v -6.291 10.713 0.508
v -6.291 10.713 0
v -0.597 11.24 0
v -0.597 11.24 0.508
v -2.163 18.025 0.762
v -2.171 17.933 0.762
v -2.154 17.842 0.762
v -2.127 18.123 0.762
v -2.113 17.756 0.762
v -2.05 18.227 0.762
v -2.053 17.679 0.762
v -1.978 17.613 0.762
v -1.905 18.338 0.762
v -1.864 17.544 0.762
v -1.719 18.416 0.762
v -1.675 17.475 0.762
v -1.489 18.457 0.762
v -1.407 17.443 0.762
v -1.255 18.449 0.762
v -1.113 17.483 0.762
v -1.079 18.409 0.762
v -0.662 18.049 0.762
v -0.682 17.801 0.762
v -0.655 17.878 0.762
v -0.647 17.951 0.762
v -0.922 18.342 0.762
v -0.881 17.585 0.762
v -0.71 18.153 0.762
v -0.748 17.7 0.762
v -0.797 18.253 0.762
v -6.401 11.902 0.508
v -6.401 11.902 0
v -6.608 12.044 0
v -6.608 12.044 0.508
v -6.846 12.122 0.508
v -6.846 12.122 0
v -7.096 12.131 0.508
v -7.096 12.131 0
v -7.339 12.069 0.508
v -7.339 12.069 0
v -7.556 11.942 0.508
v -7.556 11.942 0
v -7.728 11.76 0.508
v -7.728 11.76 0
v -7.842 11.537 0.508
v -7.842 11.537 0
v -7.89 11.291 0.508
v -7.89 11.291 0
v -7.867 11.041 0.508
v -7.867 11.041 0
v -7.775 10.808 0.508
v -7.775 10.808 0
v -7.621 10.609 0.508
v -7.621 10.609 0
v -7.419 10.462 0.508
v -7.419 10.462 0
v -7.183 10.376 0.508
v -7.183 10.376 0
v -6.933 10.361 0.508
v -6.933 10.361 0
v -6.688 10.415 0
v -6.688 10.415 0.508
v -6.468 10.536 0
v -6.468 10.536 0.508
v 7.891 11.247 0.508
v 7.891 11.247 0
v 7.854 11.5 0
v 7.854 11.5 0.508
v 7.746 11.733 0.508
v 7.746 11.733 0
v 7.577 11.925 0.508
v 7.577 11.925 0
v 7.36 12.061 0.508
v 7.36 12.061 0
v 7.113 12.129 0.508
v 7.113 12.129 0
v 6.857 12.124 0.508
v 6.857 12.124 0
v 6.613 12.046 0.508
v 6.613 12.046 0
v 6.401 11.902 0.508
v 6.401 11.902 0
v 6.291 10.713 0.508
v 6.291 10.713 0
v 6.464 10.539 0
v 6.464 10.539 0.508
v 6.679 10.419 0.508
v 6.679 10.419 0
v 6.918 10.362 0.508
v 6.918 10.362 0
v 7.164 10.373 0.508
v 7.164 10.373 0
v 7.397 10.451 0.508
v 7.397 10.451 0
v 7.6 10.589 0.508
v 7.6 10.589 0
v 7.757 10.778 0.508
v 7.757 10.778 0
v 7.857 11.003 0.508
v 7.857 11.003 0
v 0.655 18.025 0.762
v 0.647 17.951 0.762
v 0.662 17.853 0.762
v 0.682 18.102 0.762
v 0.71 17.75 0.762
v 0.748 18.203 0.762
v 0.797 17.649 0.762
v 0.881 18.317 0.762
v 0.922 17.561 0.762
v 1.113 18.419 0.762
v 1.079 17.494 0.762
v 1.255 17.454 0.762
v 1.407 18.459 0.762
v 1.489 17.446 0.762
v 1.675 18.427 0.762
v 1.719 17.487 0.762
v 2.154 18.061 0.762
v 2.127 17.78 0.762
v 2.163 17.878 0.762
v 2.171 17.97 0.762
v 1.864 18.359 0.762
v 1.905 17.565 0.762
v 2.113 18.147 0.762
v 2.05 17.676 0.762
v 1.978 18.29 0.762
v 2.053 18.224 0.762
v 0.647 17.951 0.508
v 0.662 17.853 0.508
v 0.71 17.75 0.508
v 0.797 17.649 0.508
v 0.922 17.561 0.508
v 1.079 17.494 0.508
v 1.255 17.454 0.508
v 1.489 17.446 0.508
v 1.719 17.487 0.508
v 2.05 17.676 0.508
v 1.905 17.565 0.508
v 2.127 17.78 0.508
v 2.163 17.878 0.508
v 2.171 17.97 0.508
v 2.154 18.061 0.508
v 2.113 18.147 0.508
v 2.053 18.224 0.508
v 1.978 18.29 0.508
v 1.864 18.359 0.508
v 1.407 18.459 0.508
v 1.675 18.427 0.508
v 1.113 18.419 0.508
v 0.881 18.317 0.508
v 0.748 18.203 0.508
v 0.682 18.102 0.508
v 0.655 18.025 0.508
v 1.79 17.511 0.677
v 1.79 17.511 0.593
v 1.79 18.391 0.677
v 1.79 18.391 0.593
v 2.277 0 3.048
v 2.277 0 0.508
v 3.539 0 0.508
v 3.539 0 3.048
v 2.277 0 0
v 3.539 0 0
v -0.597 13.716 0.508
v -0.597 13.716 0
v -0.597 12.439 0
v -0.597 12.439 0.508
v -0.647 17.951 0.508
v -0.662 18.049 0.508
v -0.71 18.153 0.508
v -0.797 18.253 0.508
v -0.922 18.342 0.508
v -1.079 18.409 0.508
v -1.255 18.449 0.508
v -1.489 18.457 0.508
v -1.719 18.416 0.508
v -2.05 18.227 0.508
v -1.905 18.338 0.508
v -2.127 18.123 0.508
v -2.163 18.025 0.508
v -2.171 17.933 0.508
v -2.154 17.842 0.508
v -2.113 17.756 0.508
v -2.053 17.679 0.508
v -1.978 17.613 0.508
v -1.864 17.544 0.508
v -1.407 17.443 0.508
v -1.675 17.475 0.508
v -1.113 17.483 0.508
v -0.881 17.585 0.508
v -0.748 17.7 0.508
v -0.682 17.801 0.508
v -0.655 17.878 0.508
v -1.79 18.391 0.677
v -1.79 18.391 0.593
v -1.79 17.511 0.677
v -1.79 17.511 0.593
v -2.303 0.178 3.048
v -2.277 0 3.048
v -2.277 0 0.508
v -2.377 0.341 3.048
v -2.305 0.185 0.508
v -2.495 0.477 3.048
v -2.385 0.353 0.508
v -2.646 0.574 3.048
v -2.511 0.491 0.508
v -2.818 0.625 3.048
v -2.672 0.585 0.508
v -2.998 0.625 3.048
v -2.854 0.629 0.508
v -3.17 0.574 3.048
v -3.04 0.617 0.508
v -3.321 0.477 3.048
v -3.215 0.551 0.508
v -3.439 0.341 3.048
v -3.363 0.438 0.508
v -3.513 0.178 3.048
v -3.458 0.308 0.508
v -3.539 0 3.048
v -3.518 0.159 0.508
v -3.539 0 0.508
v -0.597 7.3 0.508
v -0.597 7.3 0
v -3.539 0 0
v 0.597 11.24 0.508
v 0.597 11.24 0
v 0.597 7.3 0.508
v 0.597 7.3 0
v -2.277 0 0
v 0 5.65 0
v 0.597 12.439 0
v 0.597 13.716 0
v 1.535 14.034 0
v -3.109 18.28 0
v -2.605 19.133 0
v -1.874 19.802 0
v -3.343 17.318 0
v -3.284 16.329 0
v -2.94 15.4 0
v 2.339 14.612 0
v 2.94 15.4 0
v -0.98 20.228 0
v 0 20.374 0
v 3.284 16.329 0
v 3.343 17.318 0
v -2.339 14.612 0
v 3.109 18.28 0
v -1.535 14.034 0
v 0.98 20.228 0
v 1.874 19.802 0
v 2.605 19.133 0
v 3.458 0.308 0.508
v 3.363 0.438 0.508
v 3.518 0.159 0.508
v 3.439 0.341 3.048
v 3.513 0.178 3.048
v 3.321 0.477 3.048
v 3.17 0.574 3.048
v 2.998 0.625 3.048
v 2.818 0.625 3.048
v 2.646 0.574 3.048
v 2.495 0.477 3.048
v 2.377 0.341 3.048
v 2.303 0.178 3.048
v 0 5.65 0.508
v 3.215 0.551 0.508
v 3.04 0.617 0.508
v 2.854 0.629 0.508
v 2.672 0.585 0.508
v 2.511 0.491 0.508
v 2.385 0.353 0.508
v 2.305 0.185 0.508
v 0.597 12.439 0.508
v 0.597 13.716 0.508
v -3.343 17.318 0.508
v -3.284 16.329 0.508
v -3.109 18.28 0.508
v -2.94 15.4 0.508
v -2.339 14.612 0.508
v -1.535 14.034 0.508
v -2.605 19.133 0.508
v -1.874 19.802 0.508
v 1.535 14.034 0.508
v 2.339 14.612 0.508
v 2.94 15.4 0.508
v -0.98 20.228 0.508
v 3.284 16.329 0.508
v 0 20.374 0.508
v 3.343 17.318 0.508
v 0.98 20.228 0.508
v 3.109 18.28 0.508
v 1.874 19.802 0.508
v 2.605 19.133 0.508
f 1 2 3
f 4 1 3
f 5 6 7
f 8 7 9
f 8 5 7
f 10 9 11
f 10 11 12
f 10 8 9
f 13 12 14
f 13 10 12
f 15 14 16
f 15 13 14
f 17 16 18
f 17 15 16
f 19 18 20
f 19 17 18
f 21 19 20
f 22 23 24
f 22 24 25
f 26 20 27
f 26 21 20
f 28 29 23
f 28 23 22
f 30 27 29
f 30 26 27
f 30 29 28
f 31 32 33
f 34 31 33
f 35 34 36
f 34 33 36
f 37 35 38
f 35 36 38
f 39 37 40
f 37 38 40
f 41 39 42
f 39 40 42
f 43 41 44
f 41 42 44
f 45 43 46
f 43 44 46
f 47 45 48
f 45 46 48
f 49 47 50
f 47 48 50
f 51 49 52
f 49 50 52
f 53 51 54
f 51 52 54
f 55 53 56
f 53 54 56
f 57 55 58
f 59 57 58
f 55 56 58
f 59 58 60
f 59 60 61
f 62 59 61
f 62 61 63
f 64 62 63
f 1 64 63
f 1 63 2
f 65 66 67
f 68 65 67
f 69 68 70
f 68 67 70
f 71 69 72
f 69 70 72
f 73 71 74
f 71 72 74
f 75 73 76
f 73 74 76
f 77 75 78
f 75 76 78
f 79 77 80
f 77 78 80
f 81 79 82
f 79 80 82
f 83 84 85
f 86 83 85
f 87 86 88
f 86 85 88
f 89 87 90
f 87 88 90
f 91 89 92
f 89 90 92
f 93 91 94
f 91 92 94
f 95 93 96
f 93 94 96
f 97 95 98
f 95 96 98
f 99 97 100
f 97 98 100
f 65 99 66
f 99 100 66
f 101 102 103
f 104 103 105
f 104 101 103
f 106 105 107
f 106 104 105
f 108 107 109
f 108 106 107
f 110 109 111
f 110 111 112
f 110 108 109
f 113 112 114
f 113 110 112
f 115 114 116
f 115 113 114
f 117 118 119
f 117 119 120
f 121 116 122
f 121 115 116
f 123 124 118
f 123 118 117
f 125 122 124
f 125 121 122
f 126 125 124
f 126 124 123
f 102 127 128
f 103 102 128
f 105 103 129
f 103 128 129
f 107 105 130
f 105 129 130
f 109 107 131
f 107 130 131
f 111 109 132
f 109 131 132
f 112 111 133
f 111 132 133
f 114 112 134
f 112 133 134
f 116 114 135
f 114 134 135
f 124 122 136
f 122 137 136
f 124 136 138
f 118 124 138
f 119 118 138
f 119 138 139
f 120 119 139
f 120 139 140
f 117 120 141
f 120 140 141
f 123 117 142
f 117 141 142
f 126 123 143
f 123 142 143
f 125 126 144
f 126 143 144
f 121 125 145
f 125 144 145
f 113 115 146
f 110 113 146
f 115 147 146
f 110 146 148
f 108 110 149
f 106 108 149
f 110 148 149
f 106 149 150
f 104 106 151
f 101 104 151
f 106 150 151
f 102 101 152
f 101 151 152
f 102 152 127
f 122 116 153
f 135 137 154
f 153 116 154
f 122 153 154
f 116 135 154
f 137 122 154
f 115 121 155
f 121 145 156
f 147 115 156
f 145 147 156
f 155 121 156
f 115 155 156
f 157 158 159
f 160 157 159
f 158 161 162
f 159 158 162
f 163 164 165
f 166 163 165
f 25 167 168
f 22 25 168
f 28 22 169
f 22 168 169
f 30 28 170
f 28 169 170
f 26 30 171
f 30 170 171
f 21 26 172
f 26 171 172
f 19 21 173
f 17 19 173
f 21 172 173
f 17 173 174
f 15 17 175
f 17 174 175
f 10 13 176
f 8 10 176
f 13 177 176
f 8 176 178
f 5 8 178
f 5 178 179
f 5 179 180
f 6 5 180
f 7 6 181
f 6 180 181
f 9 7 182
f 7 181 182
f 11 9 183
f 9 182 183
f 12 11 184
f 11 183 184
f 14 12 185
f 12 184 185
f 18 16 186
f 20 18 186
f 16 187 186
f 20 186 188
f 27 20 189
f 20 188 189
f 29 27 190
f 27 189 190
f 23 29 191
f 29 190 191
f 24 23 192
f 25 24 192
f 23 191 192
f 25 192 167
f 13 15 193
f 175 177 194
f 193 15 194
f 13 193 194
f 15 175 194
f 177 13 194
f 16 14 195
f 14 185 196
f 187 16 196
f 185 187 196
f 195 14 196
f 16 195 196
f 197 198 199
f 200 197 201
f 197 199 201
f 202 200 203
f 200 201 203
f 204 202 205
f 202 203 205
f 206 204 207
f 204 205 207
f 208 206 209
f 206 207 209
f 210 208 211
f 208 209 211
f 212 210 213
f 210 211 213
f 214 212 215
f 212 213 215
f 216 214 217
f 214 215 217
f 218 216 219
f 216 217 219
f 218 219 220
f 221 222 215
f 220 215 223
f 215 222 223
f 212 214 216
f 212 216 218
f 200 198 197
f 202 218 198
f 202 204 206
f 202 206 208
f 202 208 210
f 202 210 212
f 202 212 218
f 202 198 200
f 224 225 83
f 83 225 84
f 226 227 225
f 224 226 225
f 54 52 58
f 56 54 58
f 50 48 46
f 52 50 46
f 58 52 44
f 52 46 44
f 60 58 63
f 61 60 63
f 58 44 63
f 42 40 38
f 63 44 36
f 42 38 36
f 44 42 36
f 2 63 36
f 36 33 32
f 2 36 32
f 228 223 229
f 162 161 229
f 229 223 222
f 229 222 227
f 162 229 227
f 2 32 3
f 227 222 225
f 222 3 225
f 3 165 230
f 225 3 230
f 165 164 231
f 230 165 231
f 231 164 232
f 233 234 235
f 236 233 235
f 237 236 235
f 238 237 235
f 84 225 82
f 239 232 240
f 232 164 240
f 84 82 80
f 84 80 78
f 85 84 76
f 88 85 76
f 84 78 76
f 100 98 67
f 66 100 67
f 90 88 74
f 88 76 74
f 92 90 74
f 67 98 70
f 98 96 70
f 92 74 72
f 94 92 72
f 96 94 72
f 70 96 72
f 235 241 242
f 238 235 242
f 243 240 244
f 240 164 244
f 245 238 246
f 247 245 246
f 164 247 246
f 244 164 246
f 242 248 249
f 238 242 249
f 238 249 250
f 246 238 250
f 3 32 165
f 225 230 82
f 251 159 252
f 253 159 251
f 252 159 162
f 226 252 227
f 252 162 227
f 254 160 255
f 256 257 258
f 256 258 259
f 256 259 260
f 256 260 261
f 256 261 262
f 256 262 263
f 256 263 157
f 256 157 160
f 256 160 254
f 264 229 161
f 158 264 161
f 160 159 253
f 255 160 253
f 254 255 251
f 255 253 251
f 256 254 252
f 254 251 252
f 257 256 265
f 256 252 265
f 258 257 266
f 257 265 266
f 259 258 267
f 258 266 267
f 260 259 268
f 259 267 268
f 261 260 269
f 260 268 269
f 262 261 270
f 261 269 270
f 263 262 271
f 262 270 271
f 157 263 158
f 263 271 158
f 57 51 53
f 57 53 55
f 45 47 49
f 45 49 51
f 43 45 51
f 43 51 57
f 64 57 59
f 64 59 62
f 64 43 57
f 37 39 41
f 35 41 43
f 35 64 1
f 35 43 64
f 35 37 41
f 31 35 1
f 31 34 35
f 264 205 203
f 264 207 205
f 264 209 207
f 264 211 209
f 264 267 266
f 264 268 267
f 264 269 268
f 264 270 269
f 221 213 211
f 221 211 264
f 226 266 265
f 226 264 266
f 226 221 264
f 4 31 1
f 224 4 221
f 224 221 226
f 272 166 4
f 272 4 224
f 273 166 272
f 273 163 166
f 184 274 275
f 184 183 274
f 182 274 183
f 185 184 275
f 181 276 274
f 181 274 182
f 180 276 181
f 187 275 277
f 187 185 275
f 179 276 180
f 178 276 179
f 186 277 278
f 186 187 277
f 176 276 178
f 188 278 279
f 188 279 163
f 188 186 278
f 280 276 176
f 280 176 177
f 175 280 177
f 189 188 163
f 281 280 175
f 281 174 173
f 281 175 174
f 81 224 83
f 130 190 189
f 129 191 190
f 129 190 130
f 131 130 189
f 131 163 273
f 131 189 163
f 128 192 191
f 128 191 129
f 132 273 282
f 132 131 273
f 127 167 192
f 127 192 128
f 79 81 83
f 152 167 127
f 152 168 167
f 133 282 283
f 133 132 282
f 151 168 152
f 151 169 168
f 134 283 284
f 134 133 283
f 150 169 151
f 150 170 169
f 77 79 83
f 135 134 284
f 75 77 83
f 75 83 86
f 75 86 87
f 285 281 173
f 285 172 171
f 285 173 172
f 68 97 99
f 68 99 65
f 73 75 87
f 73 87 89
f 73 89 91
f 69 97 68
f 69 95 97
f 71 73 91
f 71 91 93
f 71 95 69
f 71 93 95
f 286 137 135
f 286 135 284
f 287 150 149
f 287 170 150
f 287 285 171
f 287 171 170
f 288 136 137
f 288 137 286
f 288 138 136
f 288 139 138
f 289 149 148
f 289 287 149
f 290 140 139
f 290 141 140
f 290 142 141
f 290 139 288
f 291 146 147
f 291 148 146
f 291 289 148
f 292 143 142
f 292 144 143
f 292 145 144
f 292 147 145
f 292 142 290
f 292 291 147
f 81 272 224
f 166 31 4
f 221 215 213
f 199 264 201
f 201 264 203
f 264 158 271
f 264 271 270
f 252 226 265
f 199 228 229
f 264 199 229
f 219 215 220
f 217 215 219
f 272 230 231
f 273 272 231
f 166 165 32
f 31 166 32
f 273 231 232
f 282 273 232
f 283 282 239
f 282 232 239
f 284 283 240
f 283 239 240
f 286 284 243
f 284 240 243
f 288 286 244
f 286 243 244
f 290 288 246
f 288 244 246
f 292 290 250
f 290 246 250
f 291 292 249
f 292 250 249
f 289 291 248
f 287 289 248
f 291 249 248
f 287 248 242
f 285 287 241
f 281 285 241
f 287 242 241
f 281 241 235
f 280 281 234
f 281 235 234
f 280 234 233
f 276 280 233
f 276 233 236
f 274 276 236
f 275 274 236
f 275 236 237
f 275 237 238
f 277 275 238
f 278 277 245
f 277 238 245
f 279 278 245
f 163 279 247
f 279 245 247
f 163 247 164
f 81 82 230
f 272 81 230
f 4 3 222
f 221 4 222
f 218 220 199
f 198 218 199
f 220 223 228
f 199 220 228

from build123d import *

# Parameters (mm, degrees)
F1_DEPTH = 0.508
F3_DEPTH = 2.54
F5_DEPTH = 0.254


with BuildPart() as f1:
    # F0 (on Top) → F1 (new body)
    with BuildSketch(Plane.XY):
        with BuildLine():
            Line((0.5969, 12.4386211307), (0.5969, 13.7155528236))
            ThreePointArc((0.5969, 13.7155528236), (0, 20.3739569369), (-0.5969, 13.7155528236))
            Line((-0.5969, 13.7155528236), (-0.5969, 12.4386211307))
            Line((-0.5969, 12.4386211307), (-6.4008217303, 11.9018768547))
            ThreePointArc((-6.4008217303, 11.9018768547), (-6.1880330513, 11.6046108469), (-6.1128665152, 11.2468454306))
            ThreePointArc((-6.1128665152, 11.2468454306), (-6.1585456161, 10.965543349), (-6.2908886999, 10.7131493128))
            Line((-6.2908886999, 10.7131493128), (-0.5969, 11.2397270277))
            Line((-0.5969, 11.2397270277), (-0.5969, 7.3000811972))
            Line((-0.5969, 7.3000811972), (-3.5388981923, 0))
            Line((-3.5388981923, 0), (-2.2769883957, 0))
            Line((-2.2769883957, 0), (0, 5.6499695401))
            Line((0, 5.6499695401), (2.2769883957, 0))
            Line((2.2769883957, 0), (3.5388981923, 0))
            Line((3.5388981923, 0), (0.5969, 7.3000811972))
            Line((0.5969, 7.3000811972), (0.5969, 11.2397270277))
            Line((0.5969, 11.2397270277), (6.2908886999, 10.7131493128))
            ThreePointArc((6.2908886999, 10.7131493128), (6.1166438776, 11.3287104532), (6.4008217303, 11.9018768547))
            Line((6.4008217303, 11.9018768547), (0.5969, 12.4386211307))
        make_face()
        with BuildLine():
            ThreePointArc((7.8908665152, 11.2468454306), (7.3596319315, 12.0606788944), (6.4008217303, 11.9018768547))
            Line((6.4008217303, 11.9018768547), (7.0568330304, 11.8412092015))
            Line((7.0568330304, 11.8412092015), (6.9469, 10.6524816596))
            Line((6.9469, 10.6524816596), (6.2908886999, 10.7131493128))
            ThreePointArc((6.2908886999, 10.7131493128), (7.2831685968, 10.4035245315), (7.8908665152, 11.2468454306))
        make_face()
        with BuildLine():
            Line((7.0568330304, 11.8412092015), (6.4008217303, 11.9018768547))
            ThreePointArc((6.4008217303, 11.9018768547), (6.1166438776, 11.3287104532), (6.2908886999, 10.7131493128))
            Line((6.2908886999, 10.7131493128), (6.9469, 10.6524816596))
            Line((6.9469, 10.6524816596), (7.0568330304, 11.8412092015))
        make_face()
        with BuildLine():
            ThreePointArc((-6.1128665152, 11.2468454306), (-6.1880330513, 11.6046108469), (-6.4008217303, 11.9018768547))
            Line((-6.4008217303, 11.9018768547), (-7.0568330304, 11.8412092015))
            Line((-7.0568330304, 11.8412092015), (-6.9469, 10.6524816596))
            Line((-6.9469, 10.6524816596), (-6.2908886999, 10.7131493128))
            ThreePointArc((-6.2908886999, 10.7131493128), (-6.1585456161, 10.965543349), (-6.1128665152, 11.2468454306))
        make_face()
        with BuildLine():
            Line((-7.0568330304, 11.8412092015), (-6.4008217303, 11.9018768547))
            ThreePointArc((-6.4008217303, 11.9018768547), (-7.8870891528, 11.164980408), (-6.2908886999, 10.7131493128))
            Line((-6.2908886999, 10.7131493128), (-6.9469, 10.6524816596))
            Line((-6.9469, 10.6524816596), (-7.0568330304, 11.8412092015))
        make_face()
    extrude(amount=F1_DEPTH)

    # F2 (on face) → F3 (join)
    with BuildSketch(Plane.XY.offset(0.508)):
        with BuildLine():
            Line((-3.5388981923, 0), (-2.2769883957, 0))
            ThreePointArc((-2.2769883957, 0), (-2.907943294, 0.6309548983), (-3.5388981923, 0))
        make_face()
        with BuildLine():
            ThreePointArc((3.5388981923, 0), (2.907943294, 0.6309548983), (2.2769883957, 0))
            Line((2.2769883957, 0), (3.5388981923, 0))
        make_face()
    extrude(amount=F3_DEPTH)

    # F4 (on face) → F5 (join)
    with BuildSketch(Plane.XY.offset(0.508)):
        with BuildLine():
            add(Edge.make_bspline(
                [(-0.6474794169, 17.9513804615), (-0.6474794169, 18.8312622717), (-1.7904794169, 18.3913213666), (-2.9334794169, 17.9513804615), (-1.7904794169, 17.5114395563), (-0.6474794169, 17.0714986512), (-0.6474794169, 17.9513804615)],
                knots=[0, 0, 0, 2.0943951024, 2.0943951024, 4.1887902048, 4.1887902048, 6.2831853072, 6.2831853072, 6.2831853072], degree=2, weights=[1, 0.5, 1, 0.5, 1, 0.5, 1]))
        make_face()
        with BuildLine():
            add(Edge.make_bspline(
                [(0.6474794169, 17.9513804615), (0.6474794169, 17.0714986512), (1.7904794169, 17.5114395563), (2.9334794169, 17.9513804615), (1.7904794169, 18.3913213666), (0.6474794169, 18.8312622717), (0.6474794169, 17.9513804615)],
                knots=[0, 0, 0, 2.0943951024, 2.0943951024, 4.1887902048, 4.1887902048, 6.2831853072, 6.2831853072, 6.2831853072], degree=2, weights=[1, 0.5, 1, 0.5, 1, 0.5, 1]))
        make_face()
    extrude(amount=F5_DEPTH)


solid = f1.part
